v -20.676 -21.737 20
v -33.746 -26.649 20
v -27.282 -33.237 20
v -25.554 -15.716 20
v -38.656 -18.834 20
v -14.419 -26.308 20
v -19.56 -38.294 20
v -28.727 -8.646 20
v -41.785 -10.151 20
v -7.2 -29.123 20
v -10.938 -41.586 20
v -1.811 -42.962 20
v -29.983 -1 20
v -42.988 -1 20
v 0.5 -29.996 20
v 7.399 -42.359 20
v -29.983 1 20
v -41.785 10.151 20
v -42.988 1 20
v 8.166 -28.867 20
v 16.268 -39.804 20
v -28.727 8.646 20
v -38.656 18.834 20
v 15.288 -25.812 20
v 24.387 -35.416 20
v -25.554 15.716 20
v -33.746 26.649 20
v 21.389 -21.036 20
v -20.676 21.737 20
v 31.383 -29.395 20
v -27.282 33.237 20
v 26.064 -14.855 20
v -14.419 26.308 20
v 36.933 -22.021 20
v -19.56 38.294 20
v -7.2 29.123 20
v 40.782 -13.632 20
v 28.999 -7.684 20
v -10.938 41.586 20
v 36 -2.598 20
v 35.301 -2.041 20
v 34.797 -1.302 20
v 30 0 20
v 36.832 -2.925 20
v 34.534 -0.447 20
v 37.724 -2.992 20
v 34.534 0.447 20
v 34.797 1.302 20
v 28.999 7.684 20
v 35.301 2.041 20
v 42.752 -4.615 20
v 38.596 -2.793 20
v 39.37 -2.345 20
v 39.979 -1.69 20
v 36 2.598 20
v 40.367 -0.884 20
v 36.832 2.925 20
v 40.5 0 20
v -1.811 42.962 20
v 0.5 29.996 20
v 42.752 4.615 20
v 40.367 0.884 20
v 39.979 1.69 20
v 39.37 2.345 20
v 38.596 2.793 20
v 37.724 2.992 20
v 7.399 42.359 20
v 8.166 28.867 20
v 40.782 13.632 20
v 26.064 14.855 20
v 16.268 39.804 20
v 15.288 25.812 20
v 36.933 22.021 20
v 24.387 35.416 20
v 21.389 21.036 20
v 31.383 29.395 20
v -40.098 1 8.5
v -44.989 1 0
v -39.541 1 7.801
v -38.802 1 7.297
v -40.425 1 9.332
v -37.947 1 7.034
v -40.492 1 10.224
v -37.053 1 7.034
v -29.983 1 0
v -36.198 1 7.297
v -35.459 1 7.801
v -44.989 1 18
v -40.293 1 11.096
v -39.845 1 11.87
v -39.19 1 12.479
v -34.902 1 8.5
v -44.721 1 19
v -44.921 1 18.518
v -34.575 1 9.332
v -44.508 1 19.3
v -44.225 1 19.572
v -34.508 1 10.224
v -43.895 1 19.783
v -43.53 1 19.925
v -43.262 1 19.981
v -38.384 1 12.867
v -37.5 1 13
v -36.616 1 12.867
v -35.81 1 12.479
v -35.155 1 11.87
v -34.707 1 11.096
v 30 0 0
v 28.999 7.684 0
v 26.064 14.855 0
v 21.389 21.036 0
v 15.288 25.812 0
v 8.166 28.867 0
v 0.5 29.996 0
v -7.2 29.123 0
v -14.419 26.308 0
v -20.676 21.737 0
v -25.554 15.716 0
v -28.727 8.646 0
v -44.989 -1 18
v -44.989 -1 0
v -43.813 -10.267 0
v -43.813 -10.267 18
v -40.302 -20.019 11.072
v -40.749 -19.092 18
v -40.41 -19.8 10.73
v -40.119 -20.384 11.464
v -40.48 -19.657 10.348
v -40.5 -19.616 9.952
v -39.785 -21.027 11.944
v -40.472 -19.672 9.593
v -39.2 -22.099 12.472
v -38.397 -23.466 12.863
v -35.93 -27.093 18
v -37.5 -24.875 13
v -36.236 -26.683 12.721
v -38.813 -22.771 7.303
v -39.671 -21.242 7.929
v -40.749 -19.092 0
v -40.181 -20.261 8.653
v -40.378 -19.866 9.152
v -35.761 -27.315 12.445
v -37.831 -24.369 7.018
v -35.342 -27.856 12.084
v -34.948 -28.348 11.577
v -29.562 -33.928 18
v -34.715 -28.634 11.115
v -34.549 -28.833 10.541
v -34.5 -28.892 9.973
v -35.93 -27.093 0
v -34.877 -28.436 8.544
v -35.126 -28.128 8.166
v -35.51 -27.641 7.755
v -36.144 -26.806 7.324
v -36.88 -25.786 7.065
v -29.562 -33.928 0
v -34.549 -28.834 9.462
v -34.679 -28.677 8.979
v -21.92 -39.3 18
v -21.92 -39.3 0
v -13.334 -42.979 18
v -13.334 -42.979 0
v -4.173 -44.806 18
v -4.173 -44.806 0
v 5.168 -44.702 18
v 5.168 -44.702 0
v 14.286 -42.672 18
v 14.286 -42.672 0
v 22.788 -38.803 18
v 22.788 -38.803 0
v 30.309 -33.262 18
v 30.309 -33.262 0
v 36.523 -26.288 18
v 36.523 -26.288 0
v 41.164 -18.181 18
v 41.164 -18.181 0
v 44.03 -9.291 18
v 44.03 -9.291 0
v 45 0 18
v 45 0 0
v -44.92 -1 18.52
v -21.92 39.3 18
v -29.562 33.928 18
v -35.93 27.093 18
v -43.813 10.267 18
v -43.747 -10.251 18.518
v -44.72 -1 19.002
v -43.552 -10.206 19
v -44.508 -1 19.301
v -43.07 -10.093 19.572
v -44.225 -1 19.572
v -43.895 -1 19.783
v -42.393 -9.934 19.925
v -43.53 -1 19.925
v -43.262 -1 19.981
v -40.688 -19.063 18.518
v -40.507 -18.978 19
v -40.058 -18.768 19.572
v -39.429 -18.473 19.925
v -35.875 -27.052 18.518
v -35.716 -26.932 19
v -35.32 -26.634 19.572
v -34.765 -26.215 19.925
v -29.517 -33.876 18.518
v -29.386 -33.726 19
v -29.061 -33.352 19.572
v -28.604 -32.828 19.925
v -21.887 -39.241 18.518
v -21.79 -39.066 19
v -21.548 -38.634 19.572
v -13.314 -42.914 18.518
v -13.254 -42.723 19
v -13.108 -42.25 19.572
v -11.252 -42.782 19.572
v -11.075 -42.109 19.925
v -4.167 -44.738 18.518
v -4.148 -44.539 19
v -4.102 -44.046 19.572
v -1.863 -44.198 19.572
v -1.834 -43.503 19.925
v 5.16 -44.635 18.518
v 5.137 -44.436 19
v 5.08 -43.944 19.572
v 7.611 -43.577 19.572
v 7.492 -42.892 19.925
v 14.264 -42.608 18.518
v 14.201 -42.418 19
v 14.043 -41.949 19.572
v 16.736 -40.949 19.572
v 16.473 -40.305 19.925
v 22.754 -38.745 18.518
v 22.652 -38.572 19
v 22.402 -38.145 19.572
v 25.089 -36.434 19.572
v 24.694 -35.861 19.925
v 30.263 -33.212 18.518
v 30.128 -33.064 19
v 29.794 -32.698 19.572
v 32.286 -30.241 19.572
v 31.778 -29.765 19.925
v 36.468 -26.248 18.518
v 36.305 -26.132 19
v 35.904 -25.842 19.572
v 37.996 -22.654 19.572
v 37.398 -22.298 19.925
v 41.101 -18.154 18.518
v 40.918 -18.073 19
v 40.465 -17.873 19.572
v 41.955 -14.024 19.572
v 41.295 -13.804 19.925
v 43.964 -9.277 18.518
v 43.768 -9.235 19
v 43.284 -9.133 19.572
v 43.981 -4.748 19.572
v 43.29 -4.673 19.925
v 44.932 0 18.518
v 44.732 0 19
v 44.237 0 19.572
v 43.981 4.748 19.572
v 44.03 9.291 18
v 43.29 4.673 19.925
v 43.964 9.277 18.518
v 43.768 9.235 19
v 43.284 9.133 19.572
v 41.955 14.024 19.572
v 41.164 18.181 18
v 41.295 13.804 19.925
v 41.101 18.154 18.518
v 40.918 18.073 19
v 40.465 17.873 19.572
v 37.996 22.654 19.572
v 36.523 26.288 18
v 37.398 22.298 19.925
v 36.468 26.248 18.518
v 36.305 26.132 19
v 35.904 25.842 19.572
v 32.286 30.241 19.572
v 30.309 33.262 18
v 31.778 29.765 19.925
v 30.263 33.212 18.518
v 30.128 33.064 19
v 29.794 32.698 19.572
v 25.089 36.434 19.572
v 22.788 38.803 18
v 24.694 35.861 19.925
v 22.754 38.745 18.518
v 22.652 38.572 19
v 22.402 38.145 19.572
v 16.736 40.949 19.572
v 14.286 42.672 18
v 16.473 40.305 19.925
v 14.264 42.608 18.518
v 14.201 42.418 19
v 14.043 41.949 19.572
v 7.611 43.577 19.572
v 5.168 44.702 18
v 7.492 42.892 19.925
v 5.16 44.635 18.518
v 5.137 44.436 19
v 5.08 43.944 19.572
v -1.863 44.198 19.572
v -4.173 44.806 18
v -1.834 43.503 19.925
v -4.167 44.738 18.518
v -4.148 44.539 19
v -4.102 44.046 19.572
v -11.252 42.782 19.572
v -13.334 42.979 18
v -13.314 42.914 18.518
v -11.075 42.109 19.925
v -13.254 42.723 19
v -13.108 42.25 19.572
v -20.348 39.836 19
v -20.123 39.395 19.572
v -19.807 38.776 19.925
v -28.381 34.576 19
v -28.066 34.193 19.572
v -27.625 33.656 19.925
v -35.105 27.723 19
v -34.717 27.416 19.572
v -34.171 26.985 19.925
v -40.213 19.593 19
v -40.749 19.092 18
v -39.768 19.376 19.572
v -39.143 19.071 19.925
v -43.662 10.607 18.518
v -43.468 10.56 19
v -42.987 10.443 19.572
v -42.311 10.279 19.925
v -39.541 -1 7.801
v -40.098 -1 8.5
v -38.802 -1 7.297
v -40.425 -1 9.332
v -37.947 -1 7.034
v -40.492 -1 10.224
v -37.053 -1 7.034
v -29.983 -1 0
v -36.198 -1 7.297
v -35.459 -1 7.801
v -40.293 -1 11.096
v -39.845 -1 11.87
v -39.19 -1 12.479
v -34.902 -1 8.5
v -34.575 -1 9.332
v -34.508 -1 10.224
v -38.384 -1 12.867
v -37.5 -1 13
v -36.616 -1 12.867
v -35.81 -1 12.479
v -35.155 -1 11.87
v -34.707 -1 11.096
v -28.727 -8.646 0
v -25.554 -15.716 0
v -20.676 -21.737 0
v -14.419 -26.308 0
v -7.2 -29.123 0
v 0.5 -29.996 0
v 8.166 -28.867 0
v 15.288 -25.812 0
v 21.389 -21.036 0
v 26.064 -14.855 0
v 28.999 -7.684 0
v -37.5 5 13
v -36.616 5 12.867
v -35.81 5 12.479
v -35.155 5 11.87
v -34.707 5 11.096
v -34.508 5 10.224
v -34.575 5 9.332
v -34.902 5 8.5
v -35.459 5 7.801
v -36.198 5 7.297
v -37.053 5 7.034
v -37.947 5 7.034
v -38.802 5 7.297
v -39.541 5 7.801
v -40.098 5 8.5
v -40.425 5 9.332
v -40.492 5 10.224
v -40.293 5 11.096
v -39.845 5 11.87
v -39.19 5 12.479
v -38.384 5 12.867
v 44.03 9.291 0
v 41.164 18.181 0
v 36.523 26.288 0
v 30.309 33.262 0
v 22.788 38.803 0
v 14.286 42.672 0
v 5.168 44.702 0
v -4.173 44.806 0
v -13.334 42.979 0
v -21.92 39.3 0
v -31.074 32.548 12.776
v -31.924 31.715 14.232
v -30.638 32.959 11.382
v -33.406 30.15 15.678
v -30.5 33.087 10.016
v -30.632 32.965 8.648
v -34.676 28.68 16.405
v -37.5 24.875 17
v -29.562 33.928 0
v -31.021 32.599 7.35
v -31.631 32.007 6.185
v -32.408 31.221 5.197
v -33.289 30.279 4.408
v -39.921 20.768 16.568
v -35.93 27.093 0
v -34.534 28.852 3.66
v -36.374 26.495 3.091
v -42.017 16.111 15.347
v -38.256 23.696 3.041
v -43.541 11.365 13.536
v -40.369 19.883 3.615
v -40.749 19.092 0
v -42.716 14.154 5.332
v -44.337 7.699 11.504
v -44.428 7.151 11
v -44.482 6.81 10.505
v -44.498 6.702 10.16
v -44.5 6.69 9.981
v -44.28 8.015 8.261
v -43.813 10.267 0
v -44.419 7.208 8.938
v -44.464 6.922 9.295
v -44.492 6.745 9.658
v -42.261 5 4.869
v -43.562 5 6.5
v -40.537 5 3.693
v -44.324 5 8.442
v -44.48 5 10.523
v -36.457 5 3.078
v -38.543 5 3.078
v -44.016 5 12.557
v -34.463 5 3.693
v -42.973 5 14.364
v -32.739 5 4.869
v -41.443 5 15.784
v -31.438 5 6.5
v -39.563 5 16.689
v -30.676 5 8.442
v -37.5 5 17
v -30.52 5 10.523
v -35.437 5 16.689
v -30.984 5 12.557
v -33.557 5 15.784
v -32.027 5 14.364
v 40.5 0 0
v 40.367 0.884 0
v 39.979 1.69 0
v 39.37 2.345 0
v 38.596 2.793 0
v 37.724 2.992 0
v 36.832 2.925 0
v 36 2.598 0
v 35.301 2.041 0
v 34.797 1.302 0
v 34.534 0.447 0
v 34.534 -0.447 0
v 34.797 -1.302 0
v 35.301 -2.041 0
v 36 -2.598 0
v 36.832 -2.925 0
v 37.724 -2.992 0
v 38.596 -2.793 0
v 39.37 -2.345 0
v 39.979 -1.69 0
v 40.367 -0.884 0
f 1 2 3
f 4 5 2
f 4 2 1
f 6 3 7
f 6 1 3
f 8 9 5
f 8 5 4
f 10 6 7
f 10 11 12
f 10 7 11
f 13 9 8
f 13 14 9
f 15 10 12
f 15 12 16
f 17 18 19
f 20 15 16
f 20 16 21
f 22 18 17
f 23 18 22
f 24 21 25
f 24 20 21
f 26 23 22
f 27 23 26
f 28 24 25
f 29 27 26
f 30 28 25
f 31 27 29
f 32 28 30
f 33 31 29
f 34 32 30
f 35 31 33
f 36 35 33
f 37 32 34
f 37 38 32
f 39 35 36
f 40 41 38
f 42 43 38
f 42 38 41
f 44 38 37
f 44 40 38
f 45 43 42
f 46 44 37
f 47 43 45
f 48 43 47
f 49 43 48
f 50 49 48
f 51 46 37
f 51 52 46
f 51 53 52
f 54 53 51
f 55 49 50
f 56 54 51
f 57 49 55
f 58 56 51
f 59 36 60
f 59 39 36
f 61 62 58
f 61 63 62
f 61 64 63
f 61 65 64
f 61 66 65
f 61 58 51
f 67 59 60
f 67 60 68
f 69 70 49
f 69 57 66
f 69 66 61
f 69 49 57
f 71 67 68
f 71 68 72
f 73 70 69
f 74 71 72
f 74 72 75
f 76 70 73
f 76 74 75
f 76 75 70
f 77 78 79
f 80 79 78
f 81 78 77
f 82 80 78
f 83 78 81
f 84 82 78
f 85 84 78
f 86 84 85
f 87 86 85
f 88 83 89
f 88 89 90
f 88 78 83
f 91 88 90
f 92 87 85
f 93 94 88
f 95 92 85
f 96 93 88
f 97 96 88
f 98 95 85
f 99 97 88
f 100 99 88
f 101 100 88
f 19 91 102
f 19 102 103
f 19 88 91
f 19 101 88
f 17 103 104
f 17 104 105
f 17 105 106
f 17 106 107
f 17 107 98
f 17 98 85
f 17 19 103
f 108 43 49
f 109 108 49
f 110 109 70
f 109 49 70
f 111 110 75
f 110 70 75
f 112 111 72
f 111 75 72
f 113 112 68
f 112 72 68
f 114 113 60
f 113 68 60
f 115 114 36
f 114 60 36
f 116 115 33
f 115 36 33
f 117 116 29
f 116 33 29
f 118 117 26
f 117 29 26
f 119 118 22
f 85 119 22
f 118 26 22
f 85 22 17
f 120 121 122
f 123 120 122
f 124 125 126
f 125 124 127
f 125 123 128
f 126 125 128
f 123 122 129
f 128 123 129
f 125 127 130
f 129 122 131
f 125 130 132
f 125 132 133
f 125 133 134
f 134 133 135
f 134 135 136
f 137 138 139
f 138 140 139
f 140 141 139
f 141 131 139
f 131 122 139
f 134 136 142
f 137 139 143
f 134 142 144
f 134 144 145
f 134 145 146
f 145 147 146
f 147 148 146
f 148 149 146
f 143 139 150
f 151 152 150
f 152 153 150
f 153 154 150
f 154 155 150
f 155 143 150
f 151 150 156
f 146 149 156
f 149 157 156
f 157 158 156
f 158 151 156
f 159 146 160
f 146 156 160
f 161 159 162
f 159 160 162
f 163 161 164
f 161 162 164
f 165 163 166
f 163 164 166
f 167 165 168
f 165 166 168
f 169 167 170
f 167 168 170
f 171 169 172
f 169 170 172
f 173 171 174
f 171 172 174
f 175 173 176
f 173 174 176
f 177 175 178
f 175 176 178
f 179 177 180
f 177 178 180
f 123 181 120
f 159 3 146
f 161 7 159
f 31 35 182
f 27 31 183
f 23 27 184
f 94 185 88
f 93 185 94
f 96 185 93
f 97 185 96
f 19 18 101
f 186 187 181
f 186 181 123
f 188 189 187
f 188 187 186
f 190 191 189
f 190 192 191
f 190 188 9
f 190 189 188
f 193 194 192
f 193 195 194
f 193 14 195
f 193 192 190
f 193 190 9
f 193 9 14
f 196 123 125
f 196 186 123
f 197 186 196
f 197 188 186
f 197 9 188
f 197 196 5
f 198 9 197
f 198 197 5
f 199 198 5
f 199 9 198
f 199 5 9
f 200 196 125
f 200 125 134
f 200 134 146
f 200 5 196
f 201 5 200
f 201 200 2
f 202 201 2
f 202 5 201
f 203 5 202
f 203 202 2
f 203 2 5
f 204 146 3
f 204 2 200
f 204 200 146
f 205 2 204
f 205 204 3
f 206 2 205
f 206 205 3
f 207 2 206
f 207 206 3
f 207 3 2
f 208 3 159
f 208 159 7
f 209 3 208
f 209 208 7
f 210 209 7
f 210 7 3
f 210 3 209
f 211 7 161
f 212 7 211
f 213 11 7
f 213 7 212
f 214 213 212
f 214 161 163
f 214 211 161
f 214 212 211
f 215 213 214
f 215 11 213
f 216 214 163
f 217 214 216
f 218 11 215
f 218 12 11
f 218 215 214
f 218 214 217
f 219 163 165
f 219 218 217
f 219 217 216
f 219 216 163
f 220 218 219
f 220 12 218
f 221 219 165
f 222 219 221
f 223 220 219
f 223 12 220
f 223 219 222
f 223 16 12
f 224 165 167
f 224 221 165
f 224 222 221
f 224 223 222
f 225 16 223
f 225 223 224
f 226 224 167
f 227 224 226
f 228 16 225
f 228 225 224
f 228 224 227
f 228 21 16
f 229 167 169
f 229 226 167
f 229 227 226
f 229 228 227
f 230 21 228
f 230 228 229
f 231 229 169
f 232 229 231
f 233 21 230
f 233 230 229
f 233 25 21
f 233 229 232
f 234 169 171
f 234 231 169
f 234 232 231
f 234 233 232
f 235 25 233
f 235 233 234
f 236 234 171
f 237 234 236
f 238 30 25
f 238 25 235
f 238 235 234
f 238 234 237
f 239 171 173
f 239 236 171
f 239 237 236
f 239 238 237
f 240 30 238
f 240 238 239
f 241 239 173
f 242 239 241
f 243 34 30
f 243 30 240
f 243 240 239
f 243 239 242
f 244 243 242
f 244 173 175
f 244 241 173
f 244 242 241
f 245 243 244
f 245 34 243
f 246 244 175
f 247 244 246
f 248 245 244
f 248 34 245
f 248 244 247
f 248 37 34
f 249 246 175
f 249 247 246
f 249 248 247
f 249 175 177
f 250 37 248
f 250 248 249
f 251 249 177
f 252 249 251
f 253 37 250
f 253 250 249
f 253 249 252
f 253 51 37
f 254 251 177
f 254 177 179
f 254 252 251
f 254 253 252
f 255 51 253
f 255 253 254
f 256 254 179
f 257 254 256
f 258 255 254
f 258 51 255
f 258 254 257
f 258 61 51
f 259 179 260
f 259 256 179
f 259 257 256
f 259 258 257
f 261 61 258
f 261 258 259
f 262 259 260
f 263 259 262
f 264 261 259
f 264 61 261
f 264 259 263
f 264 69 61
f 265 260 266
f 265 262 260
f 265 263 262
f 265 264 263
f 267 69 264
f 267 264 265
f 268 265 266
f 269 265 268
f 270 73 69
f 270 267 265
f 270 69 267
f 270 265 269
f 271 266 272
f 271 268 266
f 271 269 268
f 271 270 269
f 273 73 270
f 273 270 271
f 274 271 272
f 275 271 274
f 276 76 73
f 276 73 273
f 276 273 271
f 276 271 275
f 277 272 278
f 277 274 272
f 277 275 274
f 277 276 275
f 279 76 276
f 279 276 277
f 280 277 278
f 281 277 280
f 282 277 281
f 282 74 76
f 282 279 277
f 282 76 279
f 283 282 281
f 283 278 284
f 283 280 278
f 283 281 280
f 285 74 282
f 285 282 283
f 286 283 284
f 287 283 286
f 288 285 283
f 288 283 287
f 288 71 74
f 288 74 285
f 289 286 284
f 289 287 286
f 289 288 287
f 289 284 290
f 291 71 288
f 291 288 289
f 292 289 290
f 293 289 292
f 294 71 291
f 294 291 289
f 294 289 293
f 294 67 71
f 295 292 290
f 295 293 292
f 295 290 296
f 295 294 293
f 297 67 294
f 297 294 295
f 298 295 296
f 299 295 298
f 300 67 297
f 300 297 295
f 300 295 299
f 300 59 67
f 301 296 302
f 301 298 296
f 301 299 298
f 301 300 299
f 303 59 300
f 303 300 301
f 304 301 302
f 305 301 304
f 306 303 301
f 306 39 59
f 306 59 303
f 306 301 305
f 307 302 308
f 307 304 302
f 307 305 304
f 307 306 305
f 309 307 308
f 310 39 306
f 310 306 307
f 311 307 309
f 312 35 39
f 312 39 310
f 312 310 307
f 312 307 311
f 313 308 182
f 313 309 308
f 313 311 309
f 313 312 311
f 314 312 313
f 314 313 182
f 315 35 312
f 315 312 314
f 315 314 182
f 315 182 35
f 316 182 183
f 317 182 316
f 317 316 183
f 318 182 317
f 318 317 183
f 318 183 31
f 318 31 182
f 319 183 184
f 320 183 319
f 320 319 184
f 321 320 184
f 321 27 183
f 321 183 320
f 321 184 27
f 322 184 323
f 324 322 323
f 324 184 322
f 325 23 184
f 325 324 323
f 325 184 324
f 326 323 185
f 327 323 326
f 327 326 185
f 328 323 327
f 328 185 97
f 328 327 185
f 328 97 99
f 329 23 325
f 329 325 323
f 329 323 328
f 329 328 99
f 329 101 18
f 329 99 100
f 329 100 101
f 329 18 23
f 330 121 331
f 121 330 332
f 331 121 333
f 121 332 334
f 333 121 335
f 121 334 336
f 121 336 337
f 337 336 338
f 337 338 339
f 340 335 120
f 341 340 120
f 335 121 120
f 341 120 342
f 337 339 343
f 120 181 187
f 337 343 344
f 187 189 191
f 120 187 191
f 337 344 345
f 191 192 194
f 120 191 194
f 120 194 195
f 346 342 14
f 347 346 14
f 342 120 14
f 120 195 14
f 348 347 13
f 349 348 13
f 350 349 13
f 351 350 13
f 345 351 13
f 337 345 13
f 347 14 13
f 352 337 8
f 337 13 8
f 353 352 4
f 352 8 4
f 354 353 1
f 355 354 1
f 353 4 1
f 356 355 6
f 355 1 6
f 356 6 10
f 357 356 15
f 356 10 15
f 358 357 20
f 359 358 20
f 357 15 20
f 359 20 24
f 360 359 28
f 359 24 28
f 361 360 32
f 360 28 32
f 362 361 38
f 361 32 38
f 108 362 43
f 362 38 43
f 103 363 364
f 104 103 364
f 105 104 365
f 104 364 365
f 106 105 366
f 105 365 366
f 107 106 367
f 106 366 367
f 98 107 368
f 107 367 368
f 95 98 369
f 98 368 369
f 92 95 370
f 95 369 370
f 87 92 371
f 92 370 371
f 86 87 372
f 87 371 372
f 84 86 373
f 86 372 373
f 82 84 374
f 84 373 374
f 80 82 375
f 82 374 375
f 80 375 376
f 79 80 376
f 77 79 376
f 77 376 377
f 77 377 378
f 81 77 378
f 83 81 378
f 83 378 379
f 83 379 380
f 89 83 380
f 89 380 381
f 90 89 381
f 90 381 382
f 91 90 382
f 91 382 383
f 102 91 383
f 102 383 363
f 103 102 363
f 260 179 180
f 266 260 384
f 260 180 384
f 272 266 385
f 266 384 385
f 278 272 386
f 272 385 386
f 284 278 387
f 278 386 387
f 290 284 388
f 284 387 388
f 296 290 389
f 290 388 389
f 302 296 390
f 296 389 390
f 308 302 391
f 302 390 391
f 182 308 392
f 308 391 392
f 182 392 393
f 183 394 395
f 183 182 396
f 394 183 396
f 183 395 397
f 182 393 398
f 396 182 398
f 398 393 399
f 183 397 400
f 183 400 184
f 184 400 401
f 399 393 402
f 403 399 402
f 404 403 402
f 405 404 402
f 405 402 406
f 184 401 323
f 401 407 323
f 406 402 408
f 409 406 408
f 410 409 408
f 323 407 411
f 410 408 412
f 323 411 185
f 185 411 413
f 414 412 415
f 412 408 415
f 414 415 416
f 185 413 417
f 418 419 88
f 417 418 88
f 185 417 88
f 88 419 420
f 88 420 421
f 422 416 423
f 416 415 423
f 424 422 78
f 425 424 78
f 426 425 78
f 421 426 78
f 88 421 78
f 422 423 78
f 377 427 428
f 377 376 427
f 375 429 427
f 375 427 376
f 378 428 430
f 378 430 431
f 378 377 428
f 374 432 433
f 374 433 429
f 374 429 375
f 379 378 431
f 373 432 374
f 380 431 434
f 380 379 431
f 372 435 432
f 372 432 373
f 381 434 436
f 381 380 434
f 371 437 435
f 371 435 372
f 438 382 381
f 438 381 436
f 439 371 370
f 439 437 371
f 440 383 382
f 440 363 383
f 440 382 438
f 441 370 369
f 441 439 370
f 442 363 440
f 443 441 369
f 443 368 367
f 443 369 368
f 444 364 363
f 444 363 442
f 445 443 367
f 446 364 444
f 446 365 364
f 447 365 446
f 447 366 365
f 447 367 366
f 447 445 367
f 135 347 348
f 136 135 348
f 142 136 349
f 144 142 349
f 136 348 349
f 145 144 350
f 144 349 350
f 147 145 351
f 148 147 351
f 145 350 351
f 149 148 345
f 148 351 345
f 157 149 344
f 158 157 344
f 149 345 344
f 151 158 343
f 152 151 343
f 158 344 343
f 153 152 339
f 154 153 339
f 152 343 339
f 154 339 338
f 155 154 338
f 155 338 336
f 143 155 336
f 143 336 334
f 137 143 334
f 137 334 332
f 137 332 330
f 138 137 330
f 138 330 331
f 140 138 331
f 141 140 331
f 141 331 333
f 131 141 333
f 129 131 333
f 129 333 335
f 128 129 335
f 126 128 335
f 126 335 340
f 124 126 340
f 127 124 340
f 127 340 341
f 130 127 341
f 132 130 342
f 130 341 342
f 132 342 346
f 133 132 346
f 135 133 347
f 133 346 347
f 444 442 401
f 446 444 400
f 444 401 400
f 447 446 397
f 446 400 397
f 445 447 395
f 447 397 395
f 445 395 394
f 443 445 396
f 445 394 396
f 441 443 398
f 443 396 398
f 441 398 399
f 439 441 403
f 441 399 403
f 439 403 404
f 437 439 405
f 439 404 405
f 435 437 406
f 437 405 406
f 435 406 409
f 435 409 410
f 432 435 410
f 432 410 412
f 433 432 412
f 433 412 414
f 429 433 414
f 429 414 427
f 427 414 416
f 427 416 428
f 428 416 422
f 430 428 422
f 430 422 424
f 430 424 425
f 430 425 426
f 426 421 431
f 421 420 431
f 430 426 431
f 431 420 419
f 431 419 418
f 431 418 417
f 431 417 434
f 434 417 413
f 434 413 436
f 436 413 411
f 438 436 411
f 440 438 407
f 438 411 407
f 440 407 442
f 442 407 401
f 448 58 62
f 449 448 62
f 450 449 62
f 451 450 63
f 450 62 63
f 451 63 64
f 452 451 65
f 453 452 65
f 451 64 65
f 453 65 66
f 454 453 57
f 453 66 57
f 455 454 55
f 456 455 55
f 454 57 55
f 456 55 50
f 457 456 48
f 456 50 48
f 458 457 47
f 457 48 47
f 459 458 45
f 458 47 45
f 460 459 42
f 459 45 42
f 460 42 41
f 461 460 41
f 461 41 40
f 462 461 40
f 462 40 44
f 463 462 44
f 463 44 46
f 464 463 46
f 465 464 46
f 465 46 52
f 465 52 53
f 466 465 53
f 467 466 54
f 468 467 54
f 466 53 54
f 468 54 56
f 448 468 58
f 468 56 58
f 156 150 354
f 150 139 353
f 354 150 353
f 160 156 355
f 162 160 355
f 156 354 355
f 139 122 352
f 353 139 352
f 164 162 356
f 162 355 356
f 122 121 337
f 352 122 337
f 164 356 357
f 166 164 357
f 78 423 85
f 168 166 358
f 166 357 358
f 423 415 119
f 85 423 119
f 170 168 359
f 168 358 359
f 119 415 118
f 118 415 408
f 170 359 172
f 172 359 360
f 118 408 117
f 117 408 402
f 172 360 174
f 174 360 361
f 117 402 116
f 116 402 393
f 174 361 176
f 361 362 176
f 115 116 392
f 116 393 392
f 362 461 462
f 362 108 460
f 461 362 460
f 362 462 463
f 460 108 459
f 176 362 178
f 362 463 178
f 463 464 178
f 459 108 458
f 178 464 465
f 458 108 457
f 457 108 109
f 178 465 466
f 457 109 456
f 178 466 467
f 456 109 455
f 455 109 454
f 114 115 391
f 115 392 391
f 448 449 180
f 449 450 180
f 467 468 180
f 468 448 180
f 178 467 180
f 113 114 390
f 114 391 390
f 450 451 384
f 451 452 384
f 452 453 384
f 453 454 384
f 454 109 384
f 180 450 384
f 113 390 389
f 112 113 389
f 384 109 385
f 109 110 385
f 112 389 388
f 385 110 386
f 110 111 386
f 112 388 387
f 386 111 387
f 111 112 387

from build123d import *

# Parameters (mm, degrees)
ESQUISSE1_R             = 45
BASE_EXTRUSION_DEPTH    = 20
ESQUISSE2_R             = 30
ENL_V_MAT_EXTRU_1_DEPTH = 20
ESQUISSE3_W             = 30
ESQUISSE3_H             = 2
ENL_V_MAT_EXTRU_2_DEPTH = 20
ESQUISSE4_R             = 3
ENL_V_MAT_EXTRU_3_DEPTH = 103.591422643
ESQUISSE5_R             = 7
ENL_V_MAT_EXTRU_4_DEPTH = 40
CONG_1_R                = 2
ESQUISSE6_R             = 3
ENL_V_MAT_EXTRU_5_DEPTH = 20


with BuildPart() as part:
    # Esquisse1 → Base-Extrusion (new body)
    with BuildSketch(Plane.XY):
        Circle(ESQUISSE1_R)
    extrude(amount=BASE_EXTRUSION_DEPTH)

    # Esquisse2 → Enlèv. mat.-Extru.1 (cut)
    with BuildSketch(Plane.XY.offset(20)):
        Circle(ESQUISSE2_R)
    extrude(amount=-ENL_V_MAT_EXTRU_1_DEPTH, mode=Mode.SUBTRACT)

    # Esquisse3 → Enlèv. mat.-Extru.2 (cut)
    with BuildSketch(Plane.XY.offset(20)):
        with Locations((-35, 0)):
            Rectangle(ESQUISSE3_W, ESQUISSE3_H)
    extrude(amount=-ENL_V_MAT_EXTRU_2_DEPTH, mode=Mode.SUBTRACT)

    # Esquisse4 → Enlèv. mat.-Extru.3 (cut, through all)
    with BuildSketch(Plane(origin=(0, 45, 0), x_dir=(-1, 0, 0), z_dir=(0, 1, 0))):
        with Locations(Location((37.5, 10, 0), (0, 0, 90))):
            Circle(ESQUISSE4_R)
    extrude(amount=-ENL_V_MAT_EXTRU_3_DEPTH, mode=Mode.SUBTRACT)

    # Esquisse5 → Enlèv. mat.-Extru.4 (cut)
    with BuildSketch(Plane(origin=(0, 45, 0), x_dir=(-1, 0, 0), z_dir=(0, 1, 0))):
        with Locations(Location((37.5, 10, 0), (0, 0, 90))):
            Circle(ESQUISSE5_R)
    extrude(amount=-ENL_V_MAT_EXTRU_4_DEPTH, mode=Mode.SUBTRACT)

    # Congé1
    cong_1_edges = [part.edges().sort_by_distance(p)[0] for p in [
        (0.500030871, 44.997221793, 20),
        (0.500030871, -44.997221793, 20),
    ]]
    fillet(cong_1_edges, radius=CONG_1_R)

    # Esquisse6 → Enlèv. mat.-Extru.5 (cut)
    with BuildSketch(Plane.XY.offset(20)):
        with Locations((37.5, 0)):
            Circle(ESQUISSE6_R)
    extrude(amount=-ENL_V_MAT_EXTRU_5_DEPTH, mode=Mode.SUBTRACT)


solid = part.part
